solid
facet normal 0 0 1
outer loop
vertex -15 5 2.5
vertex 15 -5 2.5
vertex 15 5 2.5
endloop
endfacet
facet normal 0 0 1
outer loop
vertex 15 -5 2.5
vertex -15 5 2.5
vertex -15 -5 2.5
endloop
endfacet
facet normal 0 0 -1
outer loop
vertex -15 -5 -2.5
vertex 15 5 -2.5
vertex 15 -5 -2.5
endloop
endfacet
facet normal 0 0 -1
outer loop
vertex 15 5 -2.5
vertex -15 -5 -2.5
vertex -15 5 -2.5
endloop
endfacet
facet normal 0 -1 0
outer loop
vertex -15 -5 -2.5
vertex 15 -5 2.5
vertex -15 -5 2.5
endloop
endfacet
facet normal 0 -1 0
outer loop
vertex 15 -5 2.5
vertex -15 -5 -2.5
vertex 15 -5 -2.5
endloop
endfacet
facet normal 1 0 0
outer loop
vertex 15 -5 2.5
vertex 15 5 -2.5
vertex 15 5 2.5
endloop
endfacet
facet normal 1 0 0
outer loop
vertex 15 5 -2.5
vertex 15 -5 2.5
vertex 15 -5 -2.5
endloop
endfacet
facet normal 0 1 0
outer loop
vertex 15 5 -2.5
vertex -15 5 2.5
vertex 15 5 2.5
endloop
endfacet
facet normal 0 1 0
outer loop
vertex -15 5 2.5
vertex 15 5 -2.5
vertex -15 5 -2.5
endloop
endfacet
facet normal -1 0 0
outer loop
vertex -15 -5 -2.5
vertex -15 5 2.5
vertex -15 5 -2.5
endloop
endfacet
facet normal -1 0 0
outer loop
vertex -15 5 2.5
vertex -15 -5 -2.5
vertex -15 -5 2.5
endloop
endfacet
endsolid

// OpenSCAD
// Generated by generate_scads.py
cube(size=[30,10,5], center=true);
